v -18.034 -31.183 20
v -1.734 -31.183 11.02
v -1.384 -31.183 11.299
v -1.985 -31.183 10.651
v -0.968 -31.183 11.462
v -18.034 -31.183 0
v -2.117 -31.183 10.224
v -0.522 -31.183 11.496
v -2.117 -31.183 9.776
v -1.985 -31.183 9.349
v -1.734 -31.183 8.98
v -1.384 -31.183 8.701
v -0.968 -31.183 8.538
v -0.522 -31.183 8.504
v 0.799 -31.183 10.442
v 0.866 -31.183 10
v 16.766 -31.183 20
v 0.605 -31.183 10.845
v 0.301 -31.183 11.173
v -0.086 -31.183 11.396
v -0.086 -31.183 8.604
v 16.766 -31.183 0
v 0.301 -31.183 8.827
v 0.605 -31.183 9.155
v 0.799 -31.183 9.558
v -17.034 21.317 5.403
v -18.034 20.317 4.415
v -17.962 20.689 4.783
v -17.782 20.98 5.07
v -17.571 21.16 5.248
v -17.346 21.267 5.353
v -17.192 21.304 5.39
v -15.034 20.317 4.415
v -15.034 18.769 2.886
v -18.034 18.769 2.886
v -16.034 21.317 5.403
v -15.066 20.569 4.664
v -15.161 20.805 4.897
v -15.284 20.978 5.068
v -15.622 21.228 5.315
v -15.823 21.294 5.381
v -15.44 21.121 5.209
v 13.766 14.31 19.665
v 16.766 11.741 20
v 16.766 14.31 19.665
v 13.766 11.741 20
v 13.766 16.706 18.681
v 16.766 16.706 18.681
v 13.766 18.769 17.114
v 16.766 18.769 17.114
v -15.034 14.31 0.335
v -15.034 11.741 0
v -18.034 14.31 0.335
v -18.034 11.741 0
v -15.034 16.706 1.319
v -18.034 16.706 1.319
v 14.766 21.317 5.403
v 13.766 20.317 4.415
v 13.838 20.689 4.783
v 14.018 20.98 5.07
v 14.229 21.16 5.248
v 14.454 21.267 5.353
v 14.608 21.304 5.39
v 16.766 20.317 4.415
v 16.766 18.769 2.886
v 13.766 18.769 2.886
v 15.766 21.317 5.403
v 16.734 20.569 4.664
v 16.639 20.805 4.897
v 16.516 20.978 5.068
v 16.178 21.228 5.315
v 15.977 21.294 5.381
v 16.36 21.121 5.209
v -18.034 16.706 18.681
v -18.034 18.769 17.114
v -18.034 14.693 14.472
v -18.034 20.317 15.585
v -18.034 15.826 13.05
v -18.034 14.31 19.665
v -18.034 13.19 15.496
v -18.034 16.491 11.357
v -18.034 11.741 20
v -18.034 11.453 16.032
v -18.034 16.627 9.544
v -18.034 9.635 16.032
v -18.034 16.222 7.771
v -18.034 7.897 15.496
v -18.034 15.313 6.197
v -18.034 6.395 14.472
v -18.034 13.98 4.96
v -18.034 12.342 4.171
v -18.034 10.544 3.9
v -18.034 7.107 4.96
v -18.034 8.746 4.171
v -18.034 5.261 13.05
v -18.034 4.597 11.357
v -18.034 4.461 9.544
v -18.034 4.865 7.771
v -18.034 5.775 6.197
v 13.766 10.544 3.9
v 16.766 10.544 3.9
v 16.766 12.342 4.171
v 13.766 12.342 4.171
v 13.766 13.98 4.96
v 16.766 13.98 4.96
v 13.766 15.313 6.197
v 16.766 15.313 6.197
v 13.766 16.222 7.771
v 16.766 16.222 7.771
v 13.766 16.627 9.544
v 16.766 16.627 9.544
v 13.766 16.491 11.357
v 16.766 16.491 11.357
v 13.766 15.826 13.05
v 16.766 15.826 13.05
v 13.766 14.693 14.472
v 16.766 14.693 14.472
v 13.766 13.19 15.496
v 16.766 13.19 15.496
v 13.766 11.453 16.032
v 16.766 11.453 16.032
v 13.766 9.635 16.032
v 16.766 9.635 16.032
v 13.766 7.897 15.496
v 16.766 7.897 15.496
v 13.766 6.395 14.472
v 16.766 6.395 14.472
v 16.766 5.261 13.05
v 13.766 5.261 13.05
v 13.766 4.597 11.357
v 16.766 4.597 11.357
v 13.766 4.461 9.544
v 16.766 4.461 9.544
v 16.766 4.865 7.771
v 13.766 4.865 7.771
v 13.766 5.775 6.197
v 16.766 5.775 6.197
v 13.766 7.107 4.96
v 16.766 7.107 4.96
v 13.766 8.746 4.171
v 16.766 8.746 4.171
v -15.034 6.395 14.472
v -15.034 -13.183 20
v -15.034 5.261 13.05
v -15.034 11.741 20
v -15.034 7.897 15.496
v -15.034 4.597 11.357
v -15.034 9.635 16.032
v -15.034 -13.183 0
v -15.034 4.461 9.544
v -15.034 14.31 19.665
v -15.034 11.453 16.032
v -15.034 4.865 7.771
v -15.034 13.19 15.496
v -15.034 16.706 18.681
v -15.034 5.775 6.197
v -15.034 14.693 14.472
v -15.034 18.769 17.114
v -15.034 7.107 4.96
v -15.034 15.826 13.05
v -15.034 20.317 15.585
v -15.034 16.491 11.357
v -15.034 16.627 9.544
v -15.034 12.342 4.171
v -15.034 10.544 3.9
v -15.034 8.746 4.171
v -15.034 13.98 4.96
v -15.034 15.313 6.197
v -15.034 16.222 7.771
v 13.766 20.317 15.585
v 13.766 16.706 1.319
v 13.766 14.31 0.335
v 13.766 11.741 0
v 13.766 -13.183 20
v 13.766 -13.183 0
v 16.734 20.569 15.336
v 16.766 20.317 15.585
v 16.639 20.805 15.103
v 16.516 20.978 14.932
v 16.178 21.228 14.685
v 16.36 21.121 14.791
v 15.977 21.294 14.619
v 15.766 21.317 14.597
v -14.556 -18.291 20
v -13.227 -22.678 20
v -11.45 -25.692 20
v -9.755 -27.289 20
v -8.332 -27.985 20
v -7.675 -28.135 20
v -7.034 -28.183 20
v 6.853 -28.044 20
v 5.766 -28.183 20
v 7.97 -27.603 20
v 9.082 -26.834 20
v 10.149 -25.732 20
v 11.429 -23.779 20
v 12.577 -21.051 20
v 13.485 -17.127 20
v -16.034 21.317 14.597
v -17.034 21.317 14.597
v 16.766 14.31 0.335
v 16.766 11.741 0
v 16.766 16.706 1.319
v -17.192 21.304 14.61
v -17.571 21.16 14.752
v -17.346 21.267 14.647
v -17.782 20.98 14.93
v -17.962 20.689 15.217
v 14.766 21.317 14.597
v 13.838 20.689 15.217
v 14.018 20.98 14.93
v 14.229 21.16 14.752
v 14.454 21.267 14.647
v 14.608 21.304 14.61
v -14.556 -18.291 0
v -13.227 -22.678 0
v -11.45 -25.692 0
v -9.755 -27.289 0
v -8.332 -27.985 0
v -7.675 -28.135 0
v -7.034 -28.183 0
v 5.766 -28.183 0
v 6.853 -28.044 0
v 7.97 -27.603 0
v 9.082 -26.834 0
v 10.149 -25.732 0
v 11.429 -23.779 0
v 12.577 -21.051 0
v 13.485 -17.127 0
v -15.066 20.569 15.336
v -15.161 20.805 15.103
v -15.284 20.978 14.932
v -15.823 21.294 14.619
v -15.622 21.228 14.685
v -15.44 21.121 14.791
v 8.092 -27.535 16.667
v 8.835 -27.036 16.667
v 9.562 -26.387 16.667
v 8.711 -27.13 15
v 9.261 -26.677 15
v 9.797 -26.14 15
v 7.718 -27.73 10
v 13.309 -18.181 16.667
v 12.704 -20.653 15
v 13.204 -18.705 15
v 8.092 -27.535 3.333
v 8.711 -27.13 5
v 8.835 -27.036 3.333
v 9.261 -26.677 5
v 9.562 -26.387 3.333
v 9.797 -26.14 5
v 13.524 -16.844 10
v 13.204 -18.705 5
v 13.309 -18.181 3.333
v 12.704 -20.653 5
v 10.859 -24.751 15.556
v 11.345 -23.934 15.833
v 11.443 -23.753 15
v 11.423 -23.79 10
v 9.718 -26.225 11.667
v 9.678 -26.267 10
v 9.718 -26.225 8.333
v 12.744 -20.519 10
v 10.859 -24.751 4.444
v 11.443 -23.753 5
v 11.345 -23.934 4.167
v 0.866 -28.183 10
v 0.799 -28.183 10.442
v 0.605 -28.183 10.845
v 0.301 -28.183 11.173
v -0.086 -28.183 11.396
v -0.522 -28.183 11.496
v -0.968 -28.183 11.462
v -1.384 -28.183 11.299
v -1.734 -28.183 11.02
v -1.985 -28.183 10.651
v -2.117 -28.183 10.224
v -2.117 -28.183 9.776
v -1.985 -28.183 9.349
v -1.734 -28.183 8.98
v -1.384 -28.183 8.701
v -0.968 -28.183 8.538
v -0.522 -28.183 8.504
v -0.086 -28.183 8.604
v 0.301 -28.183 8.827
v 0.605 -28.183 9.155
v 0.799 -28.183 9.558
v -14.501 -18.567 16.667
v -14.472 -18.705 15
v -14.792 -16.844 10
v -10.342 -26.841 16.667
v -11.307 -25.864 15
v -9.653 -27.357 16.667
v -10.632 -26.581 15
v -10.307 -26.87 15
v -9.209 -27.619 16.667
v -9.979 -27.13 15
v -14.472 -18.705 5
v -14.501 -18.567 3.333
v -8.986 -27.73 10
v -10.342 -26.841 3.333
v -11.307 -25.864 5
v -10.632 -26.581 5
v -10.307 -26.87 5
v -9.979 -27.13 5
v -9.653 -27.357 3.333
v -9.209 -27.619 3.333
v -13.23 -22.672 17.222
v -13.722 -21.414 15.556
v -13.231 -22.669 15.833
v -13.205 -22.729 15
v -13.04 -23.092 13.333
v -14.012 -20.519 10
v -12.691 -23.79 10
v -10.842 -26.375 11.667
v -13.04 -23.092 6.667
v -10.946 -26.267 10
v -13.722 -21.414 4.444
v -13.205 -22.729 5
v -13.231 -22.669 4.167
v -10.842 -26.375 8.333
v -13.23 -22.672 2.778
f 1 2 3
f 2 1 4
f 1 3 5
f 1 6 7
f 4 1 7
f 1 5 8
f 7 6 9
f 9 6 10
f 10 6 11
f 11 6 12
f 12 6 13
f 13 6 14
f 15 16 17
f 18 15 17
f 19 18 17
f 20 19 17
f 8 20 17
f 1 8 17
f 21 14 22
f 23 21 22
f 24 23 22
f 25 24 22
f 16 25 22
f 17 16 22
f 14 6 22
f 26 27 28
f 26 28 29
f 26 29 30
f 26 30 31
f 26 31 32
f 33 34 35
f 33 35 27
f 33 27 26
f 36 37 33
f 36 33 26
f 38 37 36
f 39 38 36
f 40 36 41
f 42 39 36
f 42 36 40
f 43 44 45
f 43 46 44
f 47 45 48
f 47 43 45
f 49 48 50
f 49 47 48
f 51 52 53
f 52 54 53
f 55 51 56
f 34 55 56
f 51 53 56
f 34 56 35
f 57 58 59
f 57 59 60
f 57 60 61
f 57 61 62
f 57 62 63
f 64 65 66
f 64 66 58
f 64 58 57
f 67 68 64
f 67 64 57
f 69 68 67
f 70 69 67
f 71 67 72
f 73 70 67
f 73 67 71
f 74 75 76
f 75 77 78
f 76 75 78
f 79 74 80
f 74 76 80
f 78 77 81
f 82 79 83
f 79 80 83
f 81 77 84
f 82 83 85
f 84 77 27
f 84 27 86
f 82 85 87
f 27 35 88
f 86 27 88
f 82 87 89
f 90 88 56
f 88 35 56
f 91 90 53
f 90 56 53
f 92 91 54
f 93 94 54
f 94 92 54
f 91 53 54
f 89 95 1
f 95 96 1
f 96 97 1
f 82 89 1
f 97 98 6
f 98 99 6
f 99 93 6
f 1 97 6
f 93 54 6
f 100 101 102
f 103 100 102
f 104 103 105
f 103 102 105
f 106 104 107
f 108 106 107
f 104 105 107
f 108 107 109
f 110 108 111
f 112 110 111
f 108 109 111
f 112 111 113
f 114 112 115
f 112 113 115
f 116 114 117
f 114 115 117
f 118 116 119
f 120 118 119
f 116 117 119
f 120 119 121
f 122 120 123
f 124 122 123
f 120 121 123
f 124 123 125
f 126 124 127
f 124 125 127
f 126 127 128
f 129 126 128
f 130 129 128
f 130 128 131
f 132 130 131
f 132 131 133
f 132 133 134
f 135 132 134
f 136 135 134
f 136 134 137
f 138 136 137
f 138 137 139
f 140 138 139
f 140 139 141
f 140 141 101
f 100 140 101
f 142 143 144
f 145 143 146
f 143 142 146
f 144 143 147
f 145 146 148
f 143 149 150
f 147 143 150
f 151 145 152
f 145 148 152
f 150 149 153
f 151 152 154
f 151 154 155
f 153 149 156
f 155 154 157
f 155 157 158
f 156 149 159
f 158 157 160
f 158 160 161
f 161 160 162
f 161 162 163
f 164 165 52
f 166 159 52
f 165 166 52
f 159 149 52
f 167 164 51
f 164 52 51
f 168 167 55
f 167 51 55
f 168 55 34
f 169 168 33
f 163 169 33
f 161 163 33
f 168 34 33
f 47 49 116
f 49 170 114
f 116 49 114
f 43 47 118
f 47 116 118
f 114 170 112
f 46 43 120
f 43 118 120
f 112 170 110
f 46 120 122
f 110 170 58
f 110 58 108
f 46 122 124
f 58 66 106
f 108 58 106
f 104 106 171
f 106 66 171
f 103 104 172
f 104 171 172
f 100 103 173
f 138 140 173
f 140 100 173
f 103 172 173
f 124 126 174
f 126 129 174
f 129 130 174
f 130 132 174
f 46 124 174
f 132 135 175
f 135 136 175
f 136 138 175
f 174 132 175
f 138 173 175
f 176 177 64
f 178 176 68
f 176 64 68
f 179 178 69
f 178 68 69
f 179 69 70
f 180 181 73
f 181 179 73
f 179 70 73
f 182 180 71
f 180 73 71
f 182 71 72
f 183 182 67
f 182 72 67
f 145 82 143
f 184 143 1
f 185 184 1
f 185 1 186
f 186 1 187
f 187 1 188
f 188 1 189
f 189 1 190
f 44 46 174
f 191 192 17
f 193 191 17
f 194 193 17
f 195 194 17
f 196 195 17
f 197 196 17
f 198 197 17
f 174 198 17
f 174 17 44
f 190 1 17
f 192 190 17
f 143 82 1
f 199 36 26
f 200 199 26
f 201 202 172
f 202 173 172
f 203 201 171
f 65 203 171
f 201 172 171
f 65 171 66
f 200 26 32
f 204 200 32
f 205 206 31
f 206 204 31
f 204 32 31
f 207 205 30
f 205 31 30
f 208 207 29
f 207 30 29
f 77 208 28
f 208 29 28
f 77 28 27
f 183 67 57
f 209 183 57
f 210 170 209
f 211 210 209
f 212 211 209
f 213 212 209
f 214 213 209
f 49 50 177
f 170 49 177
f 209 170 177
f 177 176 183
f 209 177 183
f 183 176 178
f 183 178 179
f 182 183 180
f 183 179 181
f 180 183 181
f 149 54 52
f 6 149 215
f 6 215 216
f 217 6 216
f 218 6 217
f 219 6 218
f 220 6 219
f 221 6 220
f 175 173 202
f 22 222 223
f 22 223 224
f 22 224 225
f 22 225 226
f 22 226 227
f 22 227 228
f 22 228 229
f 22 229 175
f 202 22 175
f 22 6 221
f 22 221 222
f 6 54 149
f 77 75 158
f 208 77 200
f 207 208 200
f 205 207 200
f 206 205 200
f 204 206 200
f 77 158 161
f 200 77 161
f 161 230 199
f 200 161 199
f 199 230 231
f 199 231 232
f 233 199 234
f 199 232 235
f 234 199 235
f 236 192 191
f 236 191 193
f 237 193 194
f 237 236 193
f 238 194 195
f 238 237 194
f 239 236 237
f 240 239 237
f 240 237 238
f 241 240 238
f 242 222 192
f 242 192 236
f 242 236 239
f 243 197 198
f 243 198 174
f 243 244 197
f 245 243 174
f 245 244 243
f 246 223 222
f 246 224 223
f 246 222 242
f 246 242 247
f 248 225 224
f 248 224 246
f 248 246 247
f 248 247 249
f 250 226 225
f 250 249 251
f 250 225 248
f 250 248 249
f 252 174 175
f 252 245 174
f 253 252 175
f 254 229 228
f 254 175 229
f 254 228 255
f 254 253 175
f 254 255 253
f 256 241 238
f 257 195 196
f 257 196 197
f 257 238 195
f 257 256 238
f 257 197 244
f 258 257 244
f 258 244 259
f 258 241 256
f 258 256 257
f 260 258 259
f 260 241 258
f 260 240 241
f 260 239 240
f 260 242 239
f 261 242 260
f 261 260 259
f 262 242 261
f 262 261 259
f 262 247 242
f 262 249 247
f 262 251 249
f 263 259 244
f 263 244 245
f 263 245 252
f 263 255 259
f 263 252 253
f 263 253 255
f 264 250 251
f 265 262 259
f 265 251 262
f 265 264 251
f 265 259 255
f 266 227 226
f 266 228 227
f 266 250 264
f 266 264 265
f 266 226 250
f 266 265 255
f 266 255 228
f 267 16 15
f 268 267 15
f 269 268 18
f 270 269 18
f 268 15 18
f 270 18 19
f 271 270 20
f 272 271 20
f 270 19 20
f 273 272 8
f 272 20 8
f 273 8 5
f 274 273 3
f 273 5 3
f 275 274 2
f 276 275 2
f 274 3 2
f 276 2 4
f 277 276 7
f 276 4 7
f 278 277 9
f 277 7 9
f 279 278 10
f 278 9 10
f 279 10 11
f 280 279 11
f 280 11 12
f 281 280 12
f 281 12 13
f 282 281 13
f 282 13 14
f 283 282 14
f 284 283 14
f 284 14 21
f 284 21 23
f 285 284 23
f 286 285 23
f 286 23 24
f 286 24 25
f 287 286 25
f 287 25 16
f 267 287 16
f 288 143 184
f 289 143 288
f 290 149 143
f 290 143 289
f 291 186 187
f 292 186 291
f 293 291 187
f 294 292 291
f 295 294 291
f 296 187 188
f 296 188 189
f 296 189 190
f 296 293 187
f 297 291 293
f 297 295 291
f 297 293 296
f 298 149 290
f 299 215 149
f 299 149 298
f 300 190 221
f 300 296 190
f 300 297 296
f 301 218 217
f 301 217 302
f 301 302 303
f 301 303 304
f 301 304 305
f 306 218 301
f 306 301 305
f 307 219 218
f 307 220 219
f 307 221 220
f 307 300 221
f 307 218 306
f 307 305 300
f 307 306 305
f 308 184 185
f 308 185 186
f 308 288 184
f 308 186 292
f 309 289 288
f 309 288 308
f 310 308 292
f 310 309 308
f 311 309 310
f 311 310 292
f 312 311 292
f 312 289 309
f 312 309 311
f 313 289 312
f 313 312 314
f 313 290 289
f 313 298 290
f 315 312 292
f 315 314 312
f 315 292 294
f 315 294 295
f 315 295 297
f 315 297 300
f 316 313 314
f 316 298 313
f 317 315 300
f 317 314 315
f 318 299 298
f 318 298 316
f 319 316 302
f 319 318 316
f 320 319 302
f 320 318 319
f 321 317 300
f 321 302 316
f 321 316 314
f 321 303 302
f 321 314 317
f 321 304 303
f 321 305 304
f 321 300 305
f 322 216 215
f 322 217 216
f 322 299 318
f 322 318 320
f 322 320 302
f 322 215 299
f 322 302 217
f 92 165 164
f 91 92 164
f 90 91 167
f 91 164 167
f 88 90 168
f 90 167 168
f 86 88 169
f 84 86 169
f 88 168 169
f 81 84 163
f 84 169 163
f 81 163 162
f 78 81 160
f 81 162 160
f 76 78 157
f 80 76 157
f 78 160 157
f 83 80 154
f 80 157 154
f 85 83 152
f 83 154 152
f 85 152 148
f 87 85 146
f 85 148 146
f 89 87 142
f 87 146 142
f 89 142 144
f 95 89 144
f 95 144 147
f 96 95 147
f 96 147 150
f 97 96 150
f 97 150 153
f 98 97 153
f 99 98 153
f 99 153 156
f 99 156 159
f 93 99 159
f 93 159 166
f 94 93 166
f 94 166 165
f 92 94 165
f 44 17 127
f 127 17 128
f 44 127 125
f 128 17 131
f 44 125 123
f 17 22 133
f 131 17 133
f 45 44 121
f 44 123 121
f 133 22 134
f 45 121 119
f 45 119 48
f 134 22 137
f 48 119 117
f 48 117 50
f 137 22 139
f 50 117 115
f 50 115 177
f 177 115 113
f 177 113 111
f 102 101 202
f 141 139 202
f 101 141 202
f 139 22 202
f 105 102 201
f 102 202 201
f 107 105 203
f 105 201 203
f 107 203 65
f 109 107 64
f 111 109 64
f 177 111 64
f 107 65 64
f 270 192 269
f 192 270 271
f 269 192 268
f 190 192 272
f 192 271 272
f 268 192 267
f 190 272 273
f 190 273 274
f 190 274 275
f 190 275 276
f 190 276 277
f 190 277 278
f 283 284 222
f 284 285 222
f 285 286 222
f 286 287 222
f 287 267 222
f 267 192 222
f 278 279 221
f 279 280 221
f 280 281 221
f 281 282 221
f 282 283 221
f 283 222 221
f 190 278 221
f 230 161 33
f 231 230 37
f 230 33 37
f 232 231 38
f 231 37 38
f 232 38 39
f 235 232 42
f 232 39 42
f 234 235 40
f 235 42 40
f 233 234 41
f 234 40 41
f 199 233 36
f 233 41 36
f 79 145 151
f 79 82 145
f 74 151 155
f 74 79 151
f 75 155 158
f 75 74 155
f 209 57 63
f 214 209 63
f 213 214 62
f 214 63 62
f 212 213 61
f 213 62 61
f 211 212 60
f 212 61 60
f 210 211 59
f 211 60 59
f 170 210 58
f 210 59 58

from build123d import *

# Parameters (mm, degrees)
EXTRUDE_1_DEPTH     = 20
CUT_EXTRUDE_1_REACH = 52.828
SKETCH_2_R          = 6.1
SKETCH_3_R          = 1.5
CUT_EXTRUDE_2_DEPTH = 52.5
FILLET_1_R          = 10
FILLET_2_SIZE       = 15
FILLET_2_SIZE_2     = 8
FILLET_3_SIZE       = 8
FILLET_3_SIZE_2     = 15


with BuildPart() as part:
    # 草图1 → 凸台-拉伸1 (new body)
    with BuildSketch(Plane.XY):
        with BuildLine():
            Line((-18.033931645, 1.331428571), (-18.033931645, -31.183456439))
            Line((-18.033931645, -31.183456439), (16.766068355, -31.183456439))
            Line((16.766068355, -31.183456439), (16.766068355, 20.316543561))
            ThreePointArc((16.766068355, 20.316543561), (16.473175136, 21.023650343), (15.766068355, 21.316543561))
            Line((15.766068355, 21.316543561), (14.766068355, 21.316543561))
            ThreePointArc((14.766068355, 21.316543561), (14.058961574, 21.023650343), (13.766068355, 20.316543561))
            Line((13.766068355, 20.316543561), (13.766068355, -23.276677649))
            Line((13.766068355, -23.276677649), (13.766068355, -28.183456439))
            Line((13.766068355, -28.183456439), (9.089631855, -28.183456439))
            Line((9.089631855, -28.183456439), (-9.577824429, -28.183456439))
            Line((-9.577824429, -28.183456439), (-15.033931645, -28.183456439))
            Line((-15.033931645, -28.183456439), (-15.033931645, -23.510349705))
            Line((-15.033931645, -23.510349705), (-15.033931645, -10.276677649))
            Line((-15.033931645, -10.276677649), (-15.033931645, 20.316543561))
            ThreePointArc((-15.033931645, 20.316543561), (-15.326824864, 21.023650343), (-16.033931645, 21.316543561))
            Line((-16.033931645, 21.316543561), (-17.033931645, 21.316543561))
            ThreePointArc((-17.033931645, 21.316543561), (-17.741038426, 21.023650343), (-18.033931645, 20.316543561))
            Line((-18.033931645, 20.316543561), (-18.033931645, 1.331428571))
        make_face()
    extrude(amount=EXTRUDE_1_DEPTH)

    # 切除-拉伸1: up to this face of the body (flat: up to its plane)
    cut_extrude_1_end = Plane(part.part.faces().sort_by_distance((-18.033931645, -5.433456439, 10))[0])
    # 草图2 → 切除-拉伸1 (cut, up to the picked face)
    with BuildSketch(Plane(origin=(16.766068355, 0, 0), x_dir=(0, 0, -1), z_dir=(1, 0, 0)), mode=Mode.PRIVATE) as cut_extrude_1_sk1:
        with Locations((-10, 10.543673469)):
            Circle(SKETCH_2_R)
    cut_extrude_1_tool1 = split(extrude(cut_extrude_1_sk1.sketch, amount=-CUT_EXTRUDE_1_REACH, mode=Mode.PRIVATE), bisect_by=cut_extrude_1_end, keep=Keep.BOTH, mode=Mode.PRIVATE)
    # 草图2 → 切除-拉伸1 (cut, up to the picked face)
    with BuildSketch(Plane(origin=(16.766068355, 0, 0), x_dir=(0, 0, -1), z_dir=(1, 0, 0)), mode=Mode.PRIVATE) as cut_extrude_1_sk2:
        Polygon((0, 15.84743417), (-5.402663646, 21.316543561), (0, 21.316543561), align=None)
    cut_extrude_1_tool2 = split(extrude(cut_extrude_1_sk2.sketch, amount=-CUT_EXTRUDE_1_REACH, mode=Mode.PRIVATE), bisect_by=cut_extrude_1_end, keep=Keep.BOTH, mode=Mode.PRIVATE)
    # 草图2 → 切除-拉伸1 (cut, up to the picked face)
    with BuildSketch(Plane(origin=(16.766068355, 0, 0), x_dir=(0, 0, -1), z_dir=(1, 0, 0)), mode=Mode.PRIVATE) as cut_extrude_1_sk3:
        Polygon((-20, 15.84743417), (-14.597336354, 21.316543561), (-20, 21.316543561), align=None)
    cut_extrude_1_tool3 = split(extrude(cut_extrude_1_sk3.sketch, amount=-CUT_EXTRUDE_1_REACH, mode=Mode.PRIVATE), bisect_by=cut_extrude_1_end, keep=Keep.BOTH, mode=Mode.PRIVATE)
    add(cut_extrude_1_tool1.solids().sort_by(Axis((16.766068, 10.543673, 10), (-1, 0, 0)))[0], mode=Mode.SUBTRACT)
    add(cut_extrude_1_tool2.solids().sort_by(Axis((16.766068, 19.493507, 1.800888), (-1, 0, 0)))[0], mode=Mode.SUBTRACT)
    add(cut_extrude_1_tool3.solids().sort_by(Axis((16.766068, 19.493507, 18.199112), (-1, 0, 0)))[0], mode=Mode.SUBTRACT)

    # 草图3 → 切除-拉伸2 (cut)
    with BuildSketch(Plane.XZ.offset(31.183456439)):
        with Locations((-0.633931645, 10)):
            Circle(SKETCH_3_R)
    extrude(amount=-CUT_EXTRUDE_2_DEPTH, mode=Mode.SUBTRACT)

    # 圆角1
    fillet_1_edges = [part.edges().sort_by_distance(p)[0] for p in [
        (15.266068355, 15.84743417, 0),
        (15.266068355, 15.84743417, 20),
        (-16.533931645, 15.84743417, 20),
        (-16.533931645, 15.84743417, 0),
    ]]
    fillet(fillet_1_edges, radius=FILLET_1_R)

    # 圆角2
    # an asymmetric fillet: 15, 8 mm, written as the material it adds along each edge
    with BuildSketch(Plane(origin=(-15.033931645, -28.183456439, 0), x_dir=(0, 1, 0), z_dir=(0, 0, 1))) as fillet_2_piece_1:
        with BuildLine():
            Bezier((FILLET_2_SIZE, 0), (0, 0), (0, -FILLET_2_SIZE_2), weights=[1, 0.707106781, 1])
            Line((0, -FILLET_2_SIZE_2), (0, 0))
            Line((0, 0), (FILLET_2_SIZE, 0))
        make_face()
    extrude(amount=20)

    # 圆角3
    # an asymmetric fillet: 15, 8 mm, written as the material it adds along each edge
    with BuildSketch(Plane(origin=(13.766068355, -28.183456439, 0), x_dir=(-1, 0, 0), z_dir=(0, 0, 1))) as fillet_3_piece_1:
        with BuildLine():
            Bezier((FILLET_3_SIZE, 0), (0, 0), (0, -FILLET_3_SIZE_2), weights=[1, 0.707106781, 1])
            Line((0, -FILLET_3_SIZE_2), (0, 0))
            Line((0, 0), (FILLET_3_SIZE, 0))
        make_face()
    extrude(amount=20)


solid = part.part
